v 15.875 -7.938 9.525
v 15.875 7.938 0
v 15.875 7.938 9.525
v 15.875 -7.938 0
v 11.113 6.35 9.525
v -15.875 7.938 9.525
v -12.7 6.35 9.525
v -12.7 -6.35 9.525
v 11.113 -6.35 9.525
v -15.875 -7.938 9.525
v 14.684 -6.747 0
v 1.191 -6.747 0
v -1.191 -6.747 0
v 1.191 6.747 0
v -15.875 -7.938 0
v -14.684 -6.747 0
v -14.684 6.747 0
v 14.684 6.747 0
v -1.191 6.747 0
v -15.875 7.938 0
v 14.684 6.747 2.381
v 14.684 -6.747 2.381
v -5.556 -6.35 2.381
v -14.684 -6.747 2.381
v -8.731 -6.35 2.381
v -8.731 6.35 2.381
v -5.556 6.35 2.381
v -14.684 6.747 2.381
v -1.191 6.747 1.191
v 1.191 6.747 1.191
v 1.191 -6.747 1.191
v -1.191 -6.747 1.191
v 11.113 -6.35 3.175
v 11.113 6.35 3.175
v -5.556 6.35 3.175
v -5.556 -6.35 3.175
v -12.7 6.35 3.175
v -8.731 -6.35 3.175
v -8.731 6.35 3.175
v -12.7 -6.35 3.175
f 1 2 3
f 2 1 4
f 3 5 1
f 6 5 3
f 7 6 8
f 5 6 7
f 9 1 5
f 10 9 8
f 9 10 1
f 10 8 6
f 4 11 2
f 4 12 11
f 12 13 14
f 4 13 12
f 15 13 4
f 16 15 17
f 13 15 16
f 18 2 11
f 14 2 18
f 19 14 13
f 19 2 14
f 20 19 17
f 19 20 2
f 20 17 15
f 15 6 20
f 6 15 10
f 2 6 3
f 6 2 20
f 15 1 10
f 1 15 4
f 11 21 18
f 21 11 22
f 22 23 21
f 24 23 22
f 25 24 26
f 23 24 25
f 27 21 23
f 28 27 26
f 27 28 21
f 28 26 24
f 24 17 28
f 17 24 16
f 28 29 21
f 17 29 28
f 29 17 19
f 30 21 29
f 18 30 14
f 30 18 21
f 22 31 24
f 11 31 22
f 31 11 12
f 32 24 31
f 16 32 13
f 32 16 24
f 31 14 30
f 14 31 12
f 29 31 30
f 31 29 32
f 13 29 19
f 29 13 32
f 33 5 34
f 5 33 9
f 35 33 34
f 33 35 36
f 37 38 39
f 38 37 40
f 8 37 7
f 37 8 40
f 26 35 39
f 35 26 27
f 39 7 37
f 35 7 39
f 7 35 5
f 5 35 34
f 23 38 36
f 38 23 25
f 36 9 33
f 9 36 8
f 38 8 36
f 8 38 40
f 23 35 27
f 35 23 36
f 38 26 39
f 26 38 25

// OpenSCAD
W=25.4*1.25;//mm
H=25.4*5/8;//mm
T=25.4*3/8;//mm
Wall=25.4*3/64;//mm
StudH=25.4*3/32;//mm

module lego4by2() {
  difference() {
  translate([0,0,T/2])
    cube([W,H,T],center=true);
  translate([0,0,StudH/2])  
    cube([W-2*Wall,H-2*Wall,StudH],  center=true);
  }
  translate([0,0,Wall/2])
  cube([2*Wall,H,Wall],center=true);
}

module servo() {
servoH=25.4*1/2;//mm
servoW=25.4*15/16;//mm
servoT=25.4*7/8;//mm
servoTabH=25.4*1/8;//mm
servoTabW=25.4*1/2;//mm
servoTabT=25.4*3/16;//mm
servoTabOffset=25.4*5/32;//mm
translate([servoTabOffset,0,0])    
union() {    
translate([servoW/2-servoTabOffset,0,servoTabH+servoT/2])
  cube([servoW,servoH,servoT],center=true);
translate([servoTabH/2,0,servoTabT/2])
  cube([servoTabH,servoH,servoTabT],center=true);
}
}  

difference() {
  lego4by2();
  translate([-W/2+25.4*1/8,0,0]) 
    servo();
}
